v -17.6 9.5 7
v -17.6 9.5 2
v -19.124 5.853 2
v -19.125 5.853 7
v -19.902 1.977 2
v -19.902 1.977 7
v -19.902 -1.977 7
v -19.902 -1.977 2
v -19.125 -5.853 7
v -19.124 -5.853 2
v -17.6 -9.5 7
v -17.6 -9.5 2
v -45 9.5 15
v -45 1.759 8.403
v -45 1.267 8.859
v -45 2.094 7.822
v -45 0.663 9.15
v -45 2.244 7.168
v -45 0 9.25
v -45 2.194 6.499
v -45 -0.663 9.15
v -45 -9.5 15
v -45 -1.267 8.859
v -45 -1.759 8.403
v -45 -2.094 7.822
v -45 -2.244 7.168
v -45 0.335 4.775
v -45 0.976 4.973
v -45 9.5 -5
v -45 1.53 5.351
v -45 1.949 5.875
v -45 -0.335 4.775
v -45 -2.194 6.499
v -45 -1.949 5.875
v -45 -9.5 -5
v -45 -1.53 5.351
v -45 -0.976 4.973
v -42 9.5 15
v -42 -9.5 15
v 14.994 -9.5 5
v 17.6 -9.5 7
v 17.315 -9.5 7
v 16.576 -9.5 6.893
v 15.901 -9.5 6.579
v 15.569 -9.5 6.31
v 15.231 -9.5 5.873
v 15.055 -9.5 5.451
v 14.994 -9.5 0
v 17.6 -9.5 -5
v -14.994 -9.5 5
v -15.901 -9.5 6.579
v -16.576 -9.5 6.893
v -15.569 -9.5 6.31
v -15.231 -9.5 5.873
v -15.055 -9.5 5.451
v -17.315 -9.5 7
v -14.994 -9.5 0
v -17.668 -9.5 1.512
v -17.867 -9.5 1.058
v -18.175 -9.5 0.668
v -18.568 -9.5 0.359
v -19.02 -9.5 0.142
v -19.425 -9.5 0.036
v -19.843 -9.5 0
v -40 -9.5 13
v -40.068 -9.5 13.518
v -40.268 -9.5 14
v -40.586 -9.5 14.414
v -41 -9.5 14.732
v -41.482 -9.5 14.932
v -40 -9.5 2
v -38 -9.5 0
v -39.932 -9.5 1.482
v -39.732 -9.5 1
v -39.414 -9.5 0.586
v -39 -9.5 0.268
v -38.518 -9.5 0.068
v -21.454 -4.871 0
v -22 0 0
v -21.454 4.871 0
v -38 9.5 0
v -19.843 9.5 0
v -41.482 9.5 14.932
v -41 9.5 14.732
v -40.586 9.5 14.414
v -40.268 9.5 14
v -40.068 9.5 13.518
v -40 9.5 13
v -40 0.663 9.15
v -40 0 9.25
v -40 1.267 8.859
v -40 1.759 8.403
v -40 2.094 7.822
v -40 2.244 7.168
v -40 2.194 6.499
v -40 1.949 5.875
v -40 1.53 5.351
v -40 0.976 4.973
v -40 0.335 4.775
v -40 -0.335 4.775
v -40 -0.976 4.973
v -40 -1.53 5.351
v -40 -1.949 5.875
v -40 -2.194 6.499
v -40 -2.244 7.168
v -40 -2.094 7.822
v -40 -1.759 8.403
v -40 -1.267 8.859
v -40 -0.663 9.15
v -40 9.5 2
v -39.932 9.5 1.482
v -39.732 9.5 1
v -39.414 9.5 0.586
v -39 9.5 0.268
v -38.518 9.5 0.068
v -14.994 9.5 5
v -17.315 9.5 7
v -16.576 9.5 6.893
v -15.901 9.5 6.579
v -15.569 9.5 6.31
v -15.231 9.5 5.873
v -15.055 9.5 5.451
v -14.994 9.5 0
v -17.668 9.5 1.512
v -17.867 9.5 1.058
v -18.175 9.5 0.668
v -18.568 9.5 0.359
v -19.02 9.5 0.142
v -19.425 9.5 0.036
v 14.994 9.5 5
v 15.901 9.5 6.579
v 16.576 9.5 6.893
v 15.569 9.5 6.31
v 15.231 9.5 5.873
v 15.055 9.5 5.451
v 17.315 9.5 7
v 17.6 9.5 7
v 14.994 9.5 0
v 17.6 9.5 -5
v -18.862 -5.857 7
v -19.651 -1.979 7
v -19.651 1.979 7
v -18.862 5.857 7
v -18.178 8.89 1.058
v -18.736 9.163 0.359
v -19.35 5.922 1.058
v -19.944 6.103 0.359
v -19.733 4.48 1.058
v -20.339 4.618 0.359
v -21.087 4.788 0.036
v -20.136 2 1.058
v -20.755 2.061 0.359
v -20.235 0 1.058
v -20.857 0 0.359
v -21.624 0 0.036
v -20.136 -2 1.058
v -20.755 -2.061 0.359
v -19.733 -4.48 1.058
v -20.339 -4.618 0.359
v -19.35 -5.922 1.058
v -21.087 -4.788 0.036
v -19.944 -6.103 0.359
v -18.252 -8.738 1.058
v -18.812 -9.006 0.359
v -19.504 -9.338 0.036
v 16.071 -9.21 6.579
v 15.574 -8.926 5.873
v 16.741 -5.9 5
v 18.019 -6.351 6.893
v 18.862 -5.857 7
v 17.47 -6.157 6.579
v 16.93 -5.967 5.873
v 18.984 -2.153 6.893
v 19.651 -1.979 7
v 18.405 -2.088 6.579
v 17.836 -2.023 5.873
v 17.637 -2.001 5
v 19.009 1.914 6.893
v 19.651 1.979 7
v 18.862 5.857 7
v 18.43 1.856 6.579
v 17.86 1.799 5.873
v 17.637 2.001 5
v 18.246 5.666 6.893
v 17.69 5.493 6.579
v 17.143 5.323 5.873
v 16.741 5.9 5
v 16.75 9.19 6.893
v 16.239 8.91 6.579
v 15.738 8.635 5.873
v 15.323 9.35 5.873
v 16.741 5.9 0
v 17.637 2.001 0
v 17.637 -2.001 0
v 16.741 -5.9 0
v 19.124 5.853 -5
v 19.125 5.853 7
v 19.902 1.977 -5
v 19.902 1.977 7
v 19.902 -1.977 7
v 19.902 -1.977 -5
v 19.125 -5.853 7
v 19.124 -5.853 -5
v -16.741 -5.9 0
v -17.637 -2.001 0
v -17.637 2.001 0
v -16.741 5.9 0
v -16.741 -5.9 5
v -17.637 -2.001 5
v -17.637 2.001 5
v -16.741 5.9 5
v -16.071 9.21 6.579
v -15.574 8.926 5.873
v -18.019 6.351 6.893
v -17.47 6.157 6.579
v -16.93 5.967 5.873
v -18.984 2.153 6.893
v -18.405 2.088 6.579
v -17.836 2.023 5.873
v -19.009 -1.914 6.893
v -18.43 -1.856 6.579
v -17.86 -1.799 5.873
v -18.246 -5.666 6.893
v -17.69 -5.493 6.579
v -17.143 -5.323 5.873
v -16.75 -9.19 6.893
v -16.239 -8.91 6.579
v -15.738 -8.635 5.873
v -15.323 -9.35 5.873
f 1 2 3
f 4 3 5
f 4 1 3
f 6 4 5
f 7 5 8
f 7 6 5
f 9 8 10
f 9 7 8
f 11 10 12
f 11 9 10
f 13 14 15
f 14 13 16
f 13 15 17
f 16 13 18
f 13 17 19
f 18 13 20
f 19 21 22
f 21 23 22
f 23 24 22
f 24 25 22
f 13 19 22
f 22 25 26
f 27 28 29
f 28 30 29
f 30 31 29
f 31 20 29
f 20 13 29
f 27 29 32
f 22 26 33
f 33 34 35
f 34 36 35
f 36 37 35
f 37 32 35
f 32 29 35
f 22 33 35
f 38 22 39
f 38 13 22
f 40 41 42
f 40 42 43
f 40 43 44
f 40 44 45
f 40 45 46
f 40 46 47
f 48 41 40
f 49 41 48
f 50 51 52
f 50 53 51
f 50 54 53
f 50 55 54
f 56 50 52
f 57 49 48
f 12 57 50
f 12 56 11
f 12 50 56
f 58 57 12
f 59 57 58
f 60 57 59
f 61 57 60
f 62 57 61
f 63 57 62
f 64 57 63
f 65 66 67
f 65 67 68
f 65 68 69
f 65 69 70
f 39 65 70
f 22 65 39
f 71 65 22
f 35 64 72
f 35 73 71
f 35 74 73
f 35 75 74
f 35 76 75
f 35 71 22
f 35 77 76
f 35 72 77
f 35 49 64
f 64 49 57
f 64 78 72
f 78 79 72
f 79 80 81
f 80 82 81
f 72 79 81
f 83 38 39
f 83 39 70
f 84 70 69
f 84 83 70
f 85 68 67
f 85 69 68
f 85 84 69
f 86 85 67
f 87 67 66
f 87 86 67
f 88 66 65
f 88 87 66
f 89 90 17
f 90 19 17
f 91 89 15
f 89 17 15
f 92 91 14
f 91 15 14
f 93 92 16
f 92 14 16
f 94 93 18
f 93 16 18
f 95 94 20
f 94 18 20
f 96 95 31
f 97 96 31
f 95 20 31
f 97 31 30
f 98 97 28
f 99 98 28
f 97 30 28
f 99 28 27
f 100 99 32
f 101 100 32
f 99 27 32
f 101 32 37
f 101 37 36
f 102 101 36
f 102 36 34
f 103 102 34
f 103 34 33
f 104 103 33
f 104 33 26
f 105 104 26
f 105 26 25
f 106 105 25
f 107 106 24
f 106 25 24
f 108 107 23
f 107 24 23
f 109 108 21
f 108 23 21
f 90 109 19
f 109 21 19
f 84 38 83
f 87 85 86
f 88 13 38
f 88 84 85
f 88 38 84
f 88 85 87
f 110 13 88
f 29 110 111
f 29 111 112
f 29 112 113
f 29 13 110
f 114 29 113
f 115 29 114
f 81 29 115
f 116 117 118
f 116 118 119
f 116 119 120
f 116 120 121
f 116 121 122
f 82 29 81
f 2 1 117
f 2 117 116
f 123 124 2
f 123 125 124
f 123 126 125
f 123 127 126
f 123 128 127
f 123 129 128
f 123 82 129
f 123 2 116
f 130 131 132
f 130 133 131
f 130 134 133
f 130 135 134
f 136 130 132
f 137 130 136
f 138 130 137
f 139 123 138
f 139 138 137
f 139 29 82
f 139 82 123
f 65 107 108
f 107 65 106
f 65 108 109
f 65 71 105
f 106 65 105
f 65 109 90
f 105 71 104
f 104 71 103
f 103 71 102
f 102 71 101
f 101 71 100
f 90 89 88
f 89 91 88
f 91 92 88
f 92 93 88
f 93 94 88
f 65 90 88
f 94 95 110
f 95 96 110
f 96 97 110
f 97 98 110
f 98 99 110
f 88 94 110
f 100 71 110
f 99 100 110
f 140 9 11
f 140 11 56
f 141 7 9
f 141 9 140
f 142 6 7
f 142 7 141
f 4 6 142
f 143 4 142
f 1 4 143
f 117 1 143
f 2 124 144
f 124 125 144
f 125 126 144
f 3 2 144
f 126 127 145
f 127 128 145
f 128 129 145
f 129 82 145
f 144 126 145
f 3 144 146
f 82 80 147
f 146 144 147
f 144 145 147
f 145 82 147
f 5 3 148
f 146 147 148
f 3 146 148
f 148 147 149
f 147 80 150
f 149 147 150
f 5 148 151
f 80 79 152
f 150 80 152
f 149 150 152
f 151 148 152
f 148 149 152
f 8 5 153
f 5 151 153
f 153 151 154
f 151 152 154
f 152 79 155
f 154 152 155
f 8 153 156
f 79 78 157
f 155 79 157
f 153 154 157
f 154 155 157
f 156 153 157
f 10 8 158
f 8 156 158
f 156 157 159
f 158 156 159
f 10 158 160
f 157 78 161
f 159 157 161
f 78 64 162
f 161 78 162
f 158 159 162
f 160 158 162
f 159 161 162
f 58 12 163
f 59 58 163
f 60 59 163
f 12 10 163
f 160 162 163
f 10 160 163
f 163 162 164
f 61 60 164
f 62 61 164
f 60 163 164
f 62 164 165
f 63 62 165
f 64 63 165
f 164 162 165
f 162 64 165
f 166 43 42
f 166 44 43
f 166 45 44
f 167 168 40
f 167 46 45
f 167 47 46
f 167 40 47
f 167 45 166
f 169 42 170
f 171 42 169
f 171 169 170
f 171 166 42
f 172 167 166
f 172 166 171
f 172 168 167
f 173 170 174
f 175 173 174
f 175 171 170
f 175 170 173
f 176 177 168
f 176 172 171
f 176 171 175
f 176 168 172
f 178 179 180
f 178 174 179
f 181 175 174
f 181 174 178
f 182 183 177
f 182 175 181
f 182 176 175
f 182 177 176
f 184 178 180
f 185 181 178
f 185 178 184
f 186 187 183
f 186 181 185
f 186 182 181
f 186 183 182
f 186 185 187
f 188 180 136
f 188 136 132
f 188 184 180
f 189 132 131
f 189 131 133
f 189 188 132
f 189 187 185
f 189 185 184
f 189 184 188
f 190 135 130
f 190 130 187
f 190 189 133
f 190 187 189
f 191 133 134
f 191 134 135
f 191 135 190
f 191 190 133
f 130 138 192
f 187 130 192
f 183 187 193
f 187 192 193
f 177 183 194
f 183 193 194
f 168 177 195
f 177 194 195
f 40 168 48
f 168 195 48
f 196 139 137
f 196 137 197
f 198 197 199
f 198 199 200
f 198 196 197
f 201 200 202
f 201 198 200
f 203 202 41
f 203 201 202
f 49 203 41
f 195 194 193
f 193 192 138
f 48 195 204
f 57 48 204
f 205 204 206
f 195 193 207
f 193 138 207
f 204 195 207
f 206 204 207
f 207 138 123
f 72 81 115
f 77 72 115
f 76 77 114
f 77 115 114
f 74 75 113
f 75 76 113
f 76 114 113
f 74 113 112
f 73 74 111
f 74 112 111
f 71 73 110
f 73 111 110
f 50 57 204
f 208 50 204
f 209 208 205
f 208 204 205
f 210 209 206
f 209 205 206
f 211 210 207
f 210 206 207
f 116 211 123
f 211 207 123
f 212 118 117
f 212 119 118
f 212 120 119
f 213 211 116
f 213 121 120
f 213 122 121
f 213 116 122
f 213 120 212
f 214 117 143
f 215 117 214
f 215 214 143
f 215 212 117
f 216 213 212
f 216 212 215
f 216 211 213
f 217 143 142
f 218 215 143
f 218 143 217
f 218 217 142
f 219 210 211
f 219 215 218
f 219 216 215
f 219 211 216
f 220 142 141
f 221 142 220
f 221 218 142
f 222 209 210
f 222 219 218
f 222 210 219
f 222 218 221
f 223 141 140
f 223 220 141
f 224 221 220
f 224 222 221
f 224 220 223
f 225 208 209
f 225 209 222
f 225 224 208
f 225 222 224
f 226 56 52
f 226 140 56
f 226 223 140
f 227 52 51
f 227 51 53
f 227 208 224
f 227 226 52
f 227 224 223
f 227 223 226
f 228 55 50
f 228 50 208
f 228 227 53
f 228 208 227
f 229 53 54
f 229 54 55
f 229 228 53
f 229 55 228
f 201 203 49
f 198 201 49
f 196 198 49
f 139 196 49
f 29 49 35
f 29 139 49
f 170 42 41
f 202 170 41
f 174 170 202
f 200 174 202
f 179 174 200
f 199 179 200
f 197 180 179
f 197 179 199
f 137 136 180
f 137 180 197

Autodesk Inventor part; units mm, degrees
ref_plane "YZ Plane" through (0, 0, 0) normal (1, 0, 0) x (0, 1, 0)
ref_plane "XZ Plane" through (0, 0, 0) normal (0, 1, 0) x (-1, 0, 0)
ref_plane "XY Plane" through (0, 0, 0) normal (0, 0, 1) x (1, 0, 0)
sketch "Sketch1" plane through (0, 0, 0) normal (0, 0, 1) x (1, 0, 0)
  circle A0 centre (0, 0) radius 17.75
  circle A1 centre (0, 0) radius 20
  dimension "d0" = 35.5
  dimension "d1" = 40
extrude "Extrusion1" add sketch "Sketch1" along normal blind 7
sketch "Sketch2" plane through (0, 0, 0) normal (0, 0, -1) x (-1, 0, 0)
  circle A0 centre (0, 0) radius 20 projected
extrude "Extrusion2" add sketch "Sketch2" along normal blind 5
sketch "Sketch3" plane through (0, 0, -5) normal (0, 0, -1) x (-1, 0, 0)
  circle A0 centre (0, 0) radius 20 projected
  line L0 (-17.5997, 9.5) -> (17.5997, 9.5)
  line L1 (-17.5997, -9.5) -> (17.5997, -9.5)
  circle A1 centre (0, 0) radius 20 projected
  line L2 (58, 0) -> (-33, 0) projected
  dimension "d6" = 19
  dimension "d7" = 9.5
extrude "Extrusion3" cut sketch "Sketch3" against normal through all contours L0 A0 | A0 L1
sketch "Sketch4" plane through (0, 0, -5) normal (0, 0, -1) x (-1, 0, 0)
  arc A0 (17.5997, -9.5) -> (17.5997, 9.5) centre (0, 0) ccw projected
  line L0 (17.5997, 9.5) -> (45, 9.5)
  line L1 (45, 9.5) -> (45, -9.5)
  arc A1 (17.5997, -9.5) -> (17.5997, 9.5) centre (0, 0) ccw projected
  line L2 (45, -9.5) -> (17.5997, -9.5)
  line L3 (14.9937, -9.5) -> (-14.9937, -9.5) projected
  arc A2 (-14.9937, 9.5) -> (-14.9937, -9.5) centre (0, 0) ccw projected
  line L4 (-14.9937, 9.5) -> (14.9937, 9.5) projected
  arc A3 (14.9937, -9.5) -> (14.9937, 9.5) centre (0, 0) ccw projected
  dimension "d10" = 90
  dimension "d11" = 45
extrude "Extrusion4" add sketch "Sketch4" against normal blind 5 contours A0 L0 L1 L2
sketch "Sketch5" plane through (0, 0, 0) normal (0, 0, 1) x (1, 0, 0)
  line L0 (17.5997, -9.5) -> (-45, -9.5) projected
  line L1 (-45, 9.5) -> (17.5997, 9.5) projected
  line L2 (-45, -9.5) -> (-40, -9.5)
  line L3 (-40, -9.5) -> (-40, 9.5)
  line L4 (-40, 9.5) -> (-45, 9.5)
  line L5 (-45, 9.5) -> (-45, -9.5)
  point P0 (0, 0)
  dimension "d14" = 5
extrude "Extrusion5" add sketch "Sketch5" along normal blind 15
sketch "Sketch6" plane through (-40, -9.5, 0) normal (1, 0, 0) x (0, 0, -1)
  point P0 (0, 9.5)
sketch "Sketch7" plane through (-45, -9.5, -5) normal (-1, 0, 0) x (0, 0, 1)
  line L0 (12, 19) -> (12, 0) projected
  circle A0 centre (12, 9.5) radius 2.25
  point P0 (5, 9.5)
  dimension "d17" = 4.5
extrude "Extrusion6" cut sketch "Sketch7" against normal up to surface (5 mm away)
fillet "Fillet1" radius 2 1 edges at (-40, 0, 0)
fillet "Fillet2" radius 2 1 edges at (-40, 0, 15)
fillet "Fillet3" radius 2 2 edges at (-17.75, 0, 7) (17.75, 0, 7)
fillet_without_effect "Fillet4"
fillet "Fillet6" radius 2 1 edges at (-20, 0, 0)
properties part number "Lid_holder"
